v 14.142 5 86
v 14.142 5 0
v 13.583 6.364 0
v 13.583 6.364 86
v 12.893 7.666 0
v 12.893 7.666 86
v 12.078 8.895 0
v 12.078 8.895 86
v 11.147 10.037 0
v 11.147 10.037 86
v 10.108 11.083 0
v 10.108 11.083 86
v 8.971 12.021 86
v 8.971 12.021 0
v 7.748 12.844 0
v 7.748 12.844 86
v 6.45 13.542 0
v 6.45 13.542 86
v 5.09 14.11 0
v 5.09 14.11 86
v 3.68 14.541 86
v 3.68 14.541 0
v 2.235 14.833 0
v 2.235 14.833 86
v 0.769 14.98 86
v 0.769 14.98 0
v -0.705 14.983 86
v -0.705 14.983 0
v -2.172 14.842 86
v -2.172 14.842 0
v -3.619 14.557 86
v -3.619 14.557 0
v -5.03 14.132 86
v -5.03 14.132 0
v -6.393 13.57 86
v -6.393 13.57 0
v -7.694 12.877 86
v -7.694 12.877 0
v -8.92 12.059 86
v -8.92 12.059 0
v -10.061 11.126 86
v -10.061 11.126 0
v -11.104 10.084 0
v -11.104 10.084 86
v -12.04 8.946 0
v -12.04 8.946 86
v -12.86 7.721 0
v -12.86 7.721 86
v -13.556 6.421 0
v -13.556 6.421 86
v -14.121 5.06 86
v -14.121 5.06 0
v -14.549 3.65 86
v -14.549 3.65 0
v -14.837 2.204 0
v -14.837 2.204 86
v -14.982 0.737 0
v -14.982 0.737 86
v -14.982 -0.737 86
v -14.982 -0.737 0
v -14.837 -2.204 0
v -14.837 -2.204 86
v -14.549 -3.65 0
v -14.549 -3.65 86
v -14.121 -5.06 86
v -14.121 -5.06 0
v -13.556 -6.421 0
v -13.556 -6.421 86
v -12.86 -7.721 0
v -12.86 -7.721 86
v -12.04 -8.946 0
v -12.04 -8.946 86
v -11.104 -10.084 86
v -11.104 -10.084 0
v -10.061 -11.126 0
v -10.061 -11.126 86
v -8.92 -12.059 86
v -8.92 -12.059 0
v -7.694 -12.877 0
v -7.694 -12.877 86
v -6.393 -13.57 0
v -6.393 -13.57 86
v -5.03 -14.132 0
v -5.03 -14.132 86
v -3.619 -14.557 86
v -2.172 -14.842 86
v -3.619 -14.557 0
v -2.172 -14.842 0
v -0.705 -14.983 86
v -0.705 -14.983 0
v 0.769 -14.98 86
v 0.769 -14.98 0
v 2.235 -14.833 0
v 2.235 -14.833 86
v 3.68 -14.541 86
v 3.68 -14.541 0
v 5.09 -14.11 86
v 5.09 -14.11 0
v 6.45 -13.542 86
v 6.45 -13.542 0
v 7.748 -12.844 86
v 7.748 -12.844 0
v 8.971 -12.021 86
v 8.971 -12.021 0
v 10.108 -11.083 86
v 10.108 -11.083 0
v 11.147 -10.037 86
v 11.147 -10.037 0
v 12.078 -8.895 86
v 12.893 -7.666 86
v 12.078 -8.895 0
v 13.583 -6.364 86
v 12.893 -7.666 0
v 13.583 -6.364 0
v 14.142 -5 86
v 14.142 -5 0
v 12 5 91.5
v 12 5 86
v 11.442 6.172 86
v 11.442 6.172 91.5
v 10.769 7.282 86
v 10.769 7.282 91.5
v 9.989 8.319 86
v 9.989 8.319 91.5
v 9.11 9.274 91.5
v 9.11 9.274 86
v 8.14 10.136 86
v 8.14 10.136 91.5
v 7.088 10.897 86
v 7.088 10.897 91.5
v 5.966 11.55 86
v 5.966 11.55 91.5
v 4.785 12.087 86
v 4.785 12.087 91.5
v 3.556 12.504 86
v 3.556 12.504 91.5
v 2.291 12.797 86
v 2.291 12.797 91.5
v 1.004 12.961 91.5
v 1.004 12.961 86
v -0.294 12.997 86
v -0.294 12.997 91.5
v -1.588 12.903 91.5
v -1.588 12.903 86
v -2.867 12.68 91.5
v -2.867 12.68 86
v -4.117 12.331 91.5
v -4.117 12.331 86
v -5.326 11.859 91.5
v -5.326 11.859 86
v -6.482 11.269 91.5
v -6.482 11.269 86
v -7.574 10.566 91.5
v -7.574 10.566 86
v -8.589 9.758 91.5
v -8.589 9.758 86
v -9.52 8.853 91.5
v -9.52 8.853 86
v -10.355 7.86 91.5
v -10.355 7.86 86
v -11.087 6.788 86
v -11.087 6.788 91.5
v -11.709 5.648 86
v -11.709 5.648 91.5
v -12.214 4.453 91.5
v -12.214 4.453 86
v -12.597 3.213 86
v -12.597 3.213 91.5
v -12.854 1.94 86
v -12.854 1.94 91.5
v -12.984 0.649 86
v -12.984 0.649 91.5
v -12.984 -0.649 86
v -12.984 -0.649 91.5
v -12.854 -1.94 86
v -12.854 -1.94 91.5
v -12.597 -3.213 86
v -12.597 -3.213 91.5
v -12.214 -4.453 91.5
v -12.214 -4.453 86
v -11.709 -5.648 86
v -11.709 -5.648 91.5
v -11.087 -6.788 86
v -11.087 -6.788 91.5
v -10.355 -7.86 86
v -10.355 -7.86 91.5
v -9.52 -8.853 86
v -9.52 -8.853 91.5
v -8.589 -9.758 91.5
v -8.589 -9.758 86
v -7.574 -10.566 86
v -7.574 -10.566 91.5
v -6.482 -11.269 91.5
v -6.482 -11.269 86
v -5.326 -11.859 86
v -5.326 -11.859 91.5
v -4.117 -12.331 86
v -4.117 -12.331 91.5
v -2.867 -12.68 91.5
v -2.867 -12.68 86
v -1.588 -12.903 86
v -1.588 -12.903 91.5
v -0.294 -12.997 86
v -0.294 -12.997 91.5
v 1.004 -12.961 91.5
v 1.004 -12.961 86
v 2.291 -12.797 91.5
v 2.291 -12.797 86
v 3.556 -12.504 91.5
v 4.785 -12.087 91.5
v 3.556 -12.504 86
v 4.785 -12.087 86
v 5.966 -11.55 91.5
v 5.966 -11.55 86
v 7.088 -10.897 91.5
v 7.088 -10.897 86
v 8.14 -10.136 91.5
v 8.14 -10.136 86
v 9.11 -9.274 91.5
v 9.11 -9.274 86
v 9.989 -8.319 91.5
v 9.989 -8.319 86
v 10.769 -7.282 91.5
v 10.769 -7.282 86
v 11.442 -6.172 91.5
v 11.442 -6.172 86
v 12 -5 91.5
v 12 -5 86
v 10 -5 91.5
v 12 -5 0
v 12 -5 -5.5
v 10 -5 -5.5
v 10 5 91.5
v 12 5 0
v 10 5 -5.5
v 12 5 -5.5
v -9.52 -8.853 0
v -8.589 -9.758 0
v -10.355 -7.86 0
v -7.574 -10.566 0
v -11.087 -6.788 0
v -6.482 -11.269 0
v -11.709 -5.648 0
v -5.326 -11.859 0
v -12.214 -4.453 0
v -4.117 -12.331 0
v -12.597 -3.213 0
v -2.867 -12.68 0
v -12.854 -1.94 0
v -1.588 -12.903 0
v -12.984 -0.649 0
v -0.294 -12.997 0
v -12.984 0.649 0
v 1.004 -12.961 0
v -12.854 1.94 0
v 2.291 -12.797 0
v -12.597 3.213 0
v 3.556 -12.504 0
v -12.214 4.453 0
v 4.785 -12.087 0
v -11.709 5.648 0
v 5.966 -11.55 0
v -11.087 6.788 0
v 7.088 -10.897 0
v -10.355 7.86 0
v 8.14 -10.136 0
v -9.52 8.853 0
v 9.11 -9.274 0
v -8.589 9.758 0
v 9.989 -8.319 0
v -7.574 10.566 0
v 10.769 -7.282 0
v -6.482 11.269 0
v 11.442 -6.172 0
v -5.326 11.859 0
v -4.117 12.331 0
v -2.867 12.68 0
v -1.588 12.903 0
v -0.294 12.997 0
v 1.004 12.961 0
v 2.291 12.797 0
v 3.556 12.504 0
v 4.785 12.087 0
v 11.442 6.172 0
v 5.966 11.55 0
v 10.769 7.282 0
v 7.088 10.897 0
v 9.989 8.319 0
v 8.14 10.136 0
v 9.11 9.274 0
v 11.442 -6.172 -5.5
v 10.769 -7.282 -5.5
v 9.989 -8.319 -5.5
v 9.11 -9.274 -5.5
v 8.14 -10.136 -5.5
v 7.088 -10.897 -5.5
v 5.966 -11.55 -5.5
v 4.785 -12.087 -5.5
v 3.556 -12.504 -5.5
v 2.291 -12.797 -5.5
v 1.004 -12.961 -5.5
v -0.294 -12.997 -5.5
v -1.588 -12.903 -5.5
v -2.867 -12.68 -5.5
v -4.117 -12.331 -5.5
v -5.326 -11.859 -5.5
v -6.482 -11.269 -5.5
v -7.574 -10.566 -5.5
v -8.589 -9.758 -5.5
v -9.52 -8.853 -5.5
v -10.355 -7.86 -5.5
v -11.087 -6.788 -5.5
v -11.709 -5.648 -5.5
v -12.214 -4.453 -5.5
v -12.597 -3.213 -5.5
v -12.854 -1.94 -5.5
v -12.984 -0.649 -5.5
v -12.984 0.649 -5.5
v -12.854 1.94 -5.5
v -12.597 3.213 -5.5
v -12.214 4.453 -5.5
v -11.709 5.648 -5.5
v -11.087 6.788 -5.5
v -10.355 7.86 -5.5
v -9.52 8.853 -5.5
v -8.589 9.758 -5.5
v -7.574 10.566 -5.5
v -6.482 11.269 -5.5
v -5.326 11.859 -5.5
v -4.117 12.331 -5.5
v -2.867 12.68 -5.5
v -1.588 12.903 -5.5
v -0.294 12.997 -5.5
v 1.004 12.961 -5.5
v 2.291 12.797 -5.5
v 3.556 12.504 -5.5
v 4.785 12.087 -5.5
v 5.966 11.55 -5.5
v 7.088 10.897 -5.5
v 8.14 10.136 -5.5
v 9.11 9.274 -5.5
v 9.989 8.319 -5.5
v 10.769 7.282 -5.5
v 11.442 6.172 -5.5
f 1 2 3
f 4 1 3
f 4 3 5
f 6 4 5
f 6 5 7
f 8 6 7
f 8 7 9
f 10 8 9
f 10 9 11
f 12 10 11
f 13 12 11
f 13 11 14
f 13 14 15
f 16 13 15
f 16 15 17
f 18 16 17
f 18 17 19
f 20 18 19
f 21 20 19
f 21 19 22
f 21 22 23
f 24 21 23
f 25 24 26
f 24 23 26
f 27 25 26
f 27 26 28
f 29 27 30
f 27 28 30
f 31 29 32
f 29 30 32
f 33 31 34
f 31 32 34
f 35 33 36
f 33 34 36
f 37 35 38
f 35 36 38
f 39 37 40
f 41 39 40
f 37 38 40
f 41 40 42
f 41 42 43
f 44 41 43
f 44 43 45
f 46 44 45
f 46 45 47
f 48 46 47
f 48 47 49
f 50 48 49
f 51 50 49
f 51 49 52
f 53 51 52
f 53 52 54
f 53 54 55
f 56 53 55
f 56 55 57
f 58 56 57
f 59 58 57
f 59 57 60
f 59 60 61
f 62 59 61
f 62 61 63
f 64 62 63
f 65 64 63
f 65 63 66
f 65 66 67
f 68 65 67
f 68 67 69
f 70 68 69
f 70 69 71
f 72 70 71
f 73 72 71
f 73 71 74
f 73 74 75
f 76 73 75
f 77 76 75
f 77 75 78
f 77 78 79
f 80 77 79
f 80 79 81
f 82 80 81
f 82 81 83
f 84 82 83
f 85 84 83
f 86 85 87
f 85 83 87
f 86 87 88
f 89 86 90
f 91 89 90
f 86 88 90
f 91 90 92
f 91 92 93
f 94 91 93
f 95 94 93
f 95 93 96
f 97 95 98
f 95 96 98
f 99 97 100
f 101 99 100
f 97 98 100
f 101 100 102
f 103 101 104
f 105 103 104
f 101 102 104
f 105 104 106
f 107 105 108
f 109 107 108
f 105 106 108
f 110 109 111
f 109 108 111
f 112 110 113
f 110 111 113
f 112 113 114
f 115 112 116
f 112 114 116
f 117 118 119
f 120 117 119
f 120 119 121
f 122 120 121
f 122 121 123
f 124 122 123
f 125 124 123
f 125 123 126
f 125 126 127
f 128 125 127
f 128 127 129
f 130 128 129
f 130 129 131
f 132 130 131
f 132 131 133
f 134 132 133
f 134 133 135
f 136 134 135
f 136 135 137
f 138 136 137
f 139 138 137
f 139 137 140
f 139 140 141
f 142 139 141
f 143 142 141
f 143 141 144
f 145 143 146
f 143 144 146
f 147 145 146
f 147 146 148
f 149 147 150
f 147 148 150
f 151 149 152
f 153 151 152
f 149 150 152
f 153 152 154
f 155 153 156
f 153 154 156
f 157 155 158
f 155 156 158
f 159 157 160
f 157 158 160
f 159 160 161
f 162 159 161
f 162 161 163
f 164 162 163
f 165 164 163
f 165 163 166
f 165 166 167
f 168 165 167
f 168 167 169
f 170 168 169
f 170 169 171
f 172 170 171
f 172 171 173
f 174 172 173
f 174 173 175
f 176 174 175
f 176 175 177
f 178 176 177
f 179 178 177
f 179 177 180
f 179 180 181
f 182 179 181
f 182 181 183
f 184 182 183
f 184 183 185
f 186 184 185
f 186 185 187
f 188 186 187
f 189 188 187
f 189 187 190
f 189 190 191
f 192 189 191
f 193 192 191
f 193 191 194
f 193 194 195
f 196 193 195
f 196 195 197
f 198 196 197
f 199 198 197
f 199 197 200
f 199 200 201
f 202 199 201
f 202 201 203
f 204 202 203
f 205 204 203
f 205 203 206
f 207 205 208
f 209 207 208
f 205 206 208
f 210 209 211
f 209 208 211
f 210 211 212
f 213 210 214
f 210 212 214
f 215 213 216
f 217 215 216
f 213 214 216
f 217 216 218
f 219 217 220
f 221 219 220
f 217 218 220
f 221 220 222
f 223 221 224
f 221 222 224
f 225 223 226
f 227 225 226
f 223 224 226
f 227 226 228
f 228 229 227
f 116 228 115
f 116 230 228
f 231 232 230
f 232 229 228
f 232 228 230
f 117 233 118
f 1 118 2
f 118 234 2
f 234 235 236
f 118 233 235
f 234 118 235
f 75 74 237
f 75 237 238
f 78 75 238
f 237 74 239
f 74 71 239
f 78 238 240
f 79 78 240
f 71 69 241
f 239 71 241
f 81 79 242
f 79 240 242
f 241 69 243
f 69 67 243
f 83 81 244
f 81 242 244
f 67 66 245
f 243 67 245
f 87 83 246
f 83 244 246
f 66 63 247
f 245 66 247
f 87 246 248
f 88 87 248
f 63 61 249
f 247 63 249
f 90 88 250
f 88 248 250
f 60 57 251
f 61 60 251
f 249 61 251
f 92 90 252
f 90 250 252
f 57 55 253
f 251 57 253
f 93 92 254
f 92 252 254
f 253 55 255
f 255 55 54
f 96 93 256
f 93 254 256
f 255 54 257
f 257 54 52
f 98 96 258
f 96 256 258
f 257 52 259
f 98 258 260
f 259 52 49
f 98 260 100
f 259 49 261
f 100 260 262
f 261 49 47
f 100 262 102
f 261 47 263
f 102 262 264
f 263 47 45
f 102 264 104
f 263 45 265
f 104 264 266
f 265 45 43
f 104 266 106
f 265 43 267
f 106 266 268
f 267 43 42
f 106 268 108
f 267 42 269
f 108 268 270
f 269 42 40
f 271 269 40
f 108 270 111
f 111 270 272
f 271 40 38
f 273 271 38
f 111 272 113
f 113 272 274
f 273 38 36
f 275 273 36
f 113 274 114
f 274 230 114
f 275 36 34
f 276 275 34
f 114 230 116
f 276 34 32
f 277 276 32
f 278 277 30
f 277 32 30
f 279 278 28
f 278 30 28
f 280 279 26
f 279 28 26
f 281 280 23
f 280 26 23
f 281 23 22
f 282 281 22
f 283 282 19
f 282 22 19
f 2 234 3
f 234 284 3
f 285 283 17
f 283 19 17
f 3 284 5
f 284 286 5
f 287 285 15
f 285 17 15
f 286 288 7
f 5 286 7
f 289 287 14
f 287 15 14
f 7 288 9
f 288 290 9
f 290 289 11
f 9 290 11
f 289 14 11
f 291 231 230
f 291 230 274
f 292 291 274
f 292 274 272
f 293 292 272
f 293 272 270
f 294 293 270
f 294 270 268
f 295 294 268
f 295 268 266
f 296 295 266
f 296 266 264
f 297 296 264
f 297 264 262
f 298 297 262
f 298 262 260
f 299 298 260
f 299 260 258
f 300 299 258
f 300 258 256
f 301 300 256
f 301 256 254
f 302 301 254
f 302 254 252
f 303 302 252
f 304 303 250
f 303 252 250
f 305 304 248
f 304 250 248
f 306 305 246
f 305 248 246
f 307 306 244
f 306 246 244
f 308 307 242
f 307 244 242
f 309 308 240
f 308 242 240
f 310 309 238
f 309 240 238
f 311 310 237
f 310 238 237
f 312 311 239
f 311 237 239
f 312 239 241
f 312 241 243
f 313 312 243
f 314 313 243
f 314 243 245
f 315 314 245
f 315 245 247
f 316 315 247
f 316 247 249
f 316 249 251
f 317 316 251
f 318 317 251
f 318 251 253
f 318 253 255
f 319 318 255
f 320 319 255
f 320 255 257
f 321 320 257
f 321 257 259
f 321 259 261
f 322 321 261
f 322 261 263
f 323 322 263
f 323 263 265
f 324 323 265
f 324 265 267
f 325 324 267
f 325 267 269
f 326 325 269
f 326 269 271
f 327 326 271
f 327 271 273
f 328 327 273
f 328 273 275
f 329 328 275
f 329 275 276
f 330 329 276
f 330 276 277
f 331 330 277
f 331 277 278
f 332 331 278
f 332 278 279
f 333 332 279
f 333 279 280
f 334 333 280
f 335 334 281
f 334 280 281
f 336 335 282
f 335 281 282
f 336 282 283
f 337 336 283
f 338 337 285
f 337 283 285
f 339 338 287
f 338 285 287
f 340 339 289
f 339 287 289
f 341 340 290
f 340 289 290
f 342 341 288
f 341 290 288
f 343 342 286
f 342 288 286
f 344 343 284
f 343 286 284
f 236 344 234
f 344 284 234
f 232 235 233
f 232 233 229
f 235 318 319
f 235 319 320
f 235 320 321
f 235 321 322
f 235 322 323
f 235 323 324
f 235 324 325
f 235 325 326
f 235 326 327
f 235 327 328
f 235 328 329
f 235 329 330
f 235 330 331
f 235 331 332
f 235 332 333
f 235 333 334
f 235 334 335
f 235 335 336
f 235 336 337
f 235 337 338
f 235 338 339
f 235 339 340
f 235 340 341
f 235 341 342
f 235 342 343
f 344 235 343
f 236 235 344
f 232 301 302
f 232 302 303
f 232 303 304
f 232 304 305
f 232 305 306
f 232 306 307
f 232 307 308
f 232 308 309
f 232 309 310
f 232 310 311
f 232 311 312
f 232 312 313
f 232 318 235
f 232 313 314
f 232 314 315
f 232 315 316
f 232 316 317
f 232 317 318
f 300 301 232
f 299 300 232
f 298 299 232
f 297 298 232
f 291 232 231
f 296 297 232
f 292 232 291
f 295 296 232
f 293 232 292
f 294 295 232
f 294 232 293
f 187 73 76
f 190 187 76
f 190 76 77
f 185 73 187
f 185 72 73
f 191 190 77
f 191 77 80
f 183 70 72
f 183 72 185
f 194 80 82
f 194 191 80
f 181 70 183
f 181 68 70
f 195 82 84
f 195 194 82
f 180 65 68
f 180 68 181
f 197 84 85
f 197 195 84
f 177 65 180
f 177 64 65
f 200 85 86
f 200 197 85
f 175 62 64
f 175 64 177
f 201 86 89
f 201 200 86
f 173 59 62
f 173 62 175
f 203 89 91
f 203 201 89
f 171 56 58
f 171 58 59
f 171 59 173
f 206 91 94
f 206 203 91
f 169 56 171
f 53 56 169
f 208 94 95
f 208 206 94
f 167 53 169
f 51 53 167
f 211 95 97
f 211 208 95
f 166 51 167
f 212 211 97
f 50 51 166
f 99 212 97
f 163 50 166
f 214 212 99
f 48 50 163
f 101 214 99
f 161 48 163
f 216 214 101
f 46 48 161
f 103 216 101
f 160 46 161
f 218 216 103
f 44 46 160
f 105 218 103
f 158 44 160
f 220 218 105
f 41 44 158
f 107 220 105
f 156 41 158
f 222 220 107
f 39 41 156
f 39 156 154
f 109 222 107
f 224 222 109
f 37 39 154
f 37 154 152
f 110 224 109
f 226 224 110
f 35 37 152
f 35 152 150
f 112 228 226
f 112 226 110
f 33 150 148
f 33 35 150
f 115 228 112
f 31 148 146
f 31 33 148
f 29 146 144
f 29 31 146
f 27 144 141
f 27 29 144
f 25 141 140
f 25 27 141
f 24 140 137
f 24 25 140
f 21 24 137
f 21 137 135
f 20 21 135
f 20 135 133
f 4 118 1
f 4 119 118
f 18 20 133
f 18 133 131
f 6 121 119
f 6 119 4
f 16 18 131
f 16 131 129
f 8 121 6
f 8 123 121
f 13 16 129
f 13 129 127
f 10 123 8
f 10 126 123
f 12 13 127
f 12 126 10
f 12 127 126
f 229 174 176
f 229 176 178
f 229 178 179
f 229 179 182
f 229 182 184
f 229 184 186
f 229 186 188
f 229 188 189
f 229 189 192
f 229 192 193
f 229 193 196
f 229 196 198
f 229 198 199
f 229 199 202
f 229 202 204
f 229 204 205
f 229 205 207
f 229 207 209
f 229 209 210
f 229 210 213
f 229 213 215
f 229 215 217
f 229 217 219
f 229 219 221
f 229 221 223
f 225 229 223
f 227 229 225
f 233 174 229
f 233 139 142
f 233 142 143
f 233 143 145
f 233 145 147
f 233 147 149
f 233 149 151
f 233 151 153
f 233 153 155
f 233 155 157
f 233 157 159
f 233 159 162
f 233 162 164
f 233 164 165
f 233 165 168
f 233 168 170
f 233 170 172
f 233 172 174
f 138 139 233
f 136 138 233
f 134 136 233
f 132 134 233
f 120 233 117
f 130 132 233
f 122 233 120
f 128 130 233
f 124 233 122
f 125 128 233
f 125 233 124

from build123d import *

# Parameters (mm, degrees)
SKETCH_R     = 15
PAD_DEPTH    = 86
SKETCH001_R  = 13
PAD001_DEPTH = 5.5
SKETCH002_R  = 13
PAD002_DEPTH = 5.5
SKETCH003_W  = 5
SKETCH003_H  = 10
POCKET_DEPTH = 117


with BuildPart() as part:
    # Sketch → Pad (new body)
    with BuildSketch(Plane.XY):
        Circle(SKETCH_R)
    extrude(amount=PAD_DEPTH)

    # Sketch001 (on Face3 of Pad) → Pad001 (join)
    with BuildSketch(Plane.XY.offset(86)):
        Circle(SKETCH001_R)
    extrude(amount=PAD001_DEPTH)

    # Sketch002 (on Face2 of Pad001) → Pad002 (join)
    with BuildSketch(Plane(origin=(0, 0, 0), x_dir=(1, 0, 0), z_dir=(0, 0, -1))):
        Circle(SKETCH002_R)
    extrude(amount=PAD002_DEPTH)

    # Sketch003 (on Face6 of Pad002) → Pocket (cut)
    with BuildSketch(Plane(origin=(0, 0, -5.5), x_dir=(1, 0, 0), z_dir=(0, 0, -1))):
        with Locations((12.5, 0)):
            Rectangle(SKETCH003_W, SKETCH003_H)
    extrude(amount=-POCKET_DEPTH, mode=Mode.SUBTRACT)


solid = part.part
